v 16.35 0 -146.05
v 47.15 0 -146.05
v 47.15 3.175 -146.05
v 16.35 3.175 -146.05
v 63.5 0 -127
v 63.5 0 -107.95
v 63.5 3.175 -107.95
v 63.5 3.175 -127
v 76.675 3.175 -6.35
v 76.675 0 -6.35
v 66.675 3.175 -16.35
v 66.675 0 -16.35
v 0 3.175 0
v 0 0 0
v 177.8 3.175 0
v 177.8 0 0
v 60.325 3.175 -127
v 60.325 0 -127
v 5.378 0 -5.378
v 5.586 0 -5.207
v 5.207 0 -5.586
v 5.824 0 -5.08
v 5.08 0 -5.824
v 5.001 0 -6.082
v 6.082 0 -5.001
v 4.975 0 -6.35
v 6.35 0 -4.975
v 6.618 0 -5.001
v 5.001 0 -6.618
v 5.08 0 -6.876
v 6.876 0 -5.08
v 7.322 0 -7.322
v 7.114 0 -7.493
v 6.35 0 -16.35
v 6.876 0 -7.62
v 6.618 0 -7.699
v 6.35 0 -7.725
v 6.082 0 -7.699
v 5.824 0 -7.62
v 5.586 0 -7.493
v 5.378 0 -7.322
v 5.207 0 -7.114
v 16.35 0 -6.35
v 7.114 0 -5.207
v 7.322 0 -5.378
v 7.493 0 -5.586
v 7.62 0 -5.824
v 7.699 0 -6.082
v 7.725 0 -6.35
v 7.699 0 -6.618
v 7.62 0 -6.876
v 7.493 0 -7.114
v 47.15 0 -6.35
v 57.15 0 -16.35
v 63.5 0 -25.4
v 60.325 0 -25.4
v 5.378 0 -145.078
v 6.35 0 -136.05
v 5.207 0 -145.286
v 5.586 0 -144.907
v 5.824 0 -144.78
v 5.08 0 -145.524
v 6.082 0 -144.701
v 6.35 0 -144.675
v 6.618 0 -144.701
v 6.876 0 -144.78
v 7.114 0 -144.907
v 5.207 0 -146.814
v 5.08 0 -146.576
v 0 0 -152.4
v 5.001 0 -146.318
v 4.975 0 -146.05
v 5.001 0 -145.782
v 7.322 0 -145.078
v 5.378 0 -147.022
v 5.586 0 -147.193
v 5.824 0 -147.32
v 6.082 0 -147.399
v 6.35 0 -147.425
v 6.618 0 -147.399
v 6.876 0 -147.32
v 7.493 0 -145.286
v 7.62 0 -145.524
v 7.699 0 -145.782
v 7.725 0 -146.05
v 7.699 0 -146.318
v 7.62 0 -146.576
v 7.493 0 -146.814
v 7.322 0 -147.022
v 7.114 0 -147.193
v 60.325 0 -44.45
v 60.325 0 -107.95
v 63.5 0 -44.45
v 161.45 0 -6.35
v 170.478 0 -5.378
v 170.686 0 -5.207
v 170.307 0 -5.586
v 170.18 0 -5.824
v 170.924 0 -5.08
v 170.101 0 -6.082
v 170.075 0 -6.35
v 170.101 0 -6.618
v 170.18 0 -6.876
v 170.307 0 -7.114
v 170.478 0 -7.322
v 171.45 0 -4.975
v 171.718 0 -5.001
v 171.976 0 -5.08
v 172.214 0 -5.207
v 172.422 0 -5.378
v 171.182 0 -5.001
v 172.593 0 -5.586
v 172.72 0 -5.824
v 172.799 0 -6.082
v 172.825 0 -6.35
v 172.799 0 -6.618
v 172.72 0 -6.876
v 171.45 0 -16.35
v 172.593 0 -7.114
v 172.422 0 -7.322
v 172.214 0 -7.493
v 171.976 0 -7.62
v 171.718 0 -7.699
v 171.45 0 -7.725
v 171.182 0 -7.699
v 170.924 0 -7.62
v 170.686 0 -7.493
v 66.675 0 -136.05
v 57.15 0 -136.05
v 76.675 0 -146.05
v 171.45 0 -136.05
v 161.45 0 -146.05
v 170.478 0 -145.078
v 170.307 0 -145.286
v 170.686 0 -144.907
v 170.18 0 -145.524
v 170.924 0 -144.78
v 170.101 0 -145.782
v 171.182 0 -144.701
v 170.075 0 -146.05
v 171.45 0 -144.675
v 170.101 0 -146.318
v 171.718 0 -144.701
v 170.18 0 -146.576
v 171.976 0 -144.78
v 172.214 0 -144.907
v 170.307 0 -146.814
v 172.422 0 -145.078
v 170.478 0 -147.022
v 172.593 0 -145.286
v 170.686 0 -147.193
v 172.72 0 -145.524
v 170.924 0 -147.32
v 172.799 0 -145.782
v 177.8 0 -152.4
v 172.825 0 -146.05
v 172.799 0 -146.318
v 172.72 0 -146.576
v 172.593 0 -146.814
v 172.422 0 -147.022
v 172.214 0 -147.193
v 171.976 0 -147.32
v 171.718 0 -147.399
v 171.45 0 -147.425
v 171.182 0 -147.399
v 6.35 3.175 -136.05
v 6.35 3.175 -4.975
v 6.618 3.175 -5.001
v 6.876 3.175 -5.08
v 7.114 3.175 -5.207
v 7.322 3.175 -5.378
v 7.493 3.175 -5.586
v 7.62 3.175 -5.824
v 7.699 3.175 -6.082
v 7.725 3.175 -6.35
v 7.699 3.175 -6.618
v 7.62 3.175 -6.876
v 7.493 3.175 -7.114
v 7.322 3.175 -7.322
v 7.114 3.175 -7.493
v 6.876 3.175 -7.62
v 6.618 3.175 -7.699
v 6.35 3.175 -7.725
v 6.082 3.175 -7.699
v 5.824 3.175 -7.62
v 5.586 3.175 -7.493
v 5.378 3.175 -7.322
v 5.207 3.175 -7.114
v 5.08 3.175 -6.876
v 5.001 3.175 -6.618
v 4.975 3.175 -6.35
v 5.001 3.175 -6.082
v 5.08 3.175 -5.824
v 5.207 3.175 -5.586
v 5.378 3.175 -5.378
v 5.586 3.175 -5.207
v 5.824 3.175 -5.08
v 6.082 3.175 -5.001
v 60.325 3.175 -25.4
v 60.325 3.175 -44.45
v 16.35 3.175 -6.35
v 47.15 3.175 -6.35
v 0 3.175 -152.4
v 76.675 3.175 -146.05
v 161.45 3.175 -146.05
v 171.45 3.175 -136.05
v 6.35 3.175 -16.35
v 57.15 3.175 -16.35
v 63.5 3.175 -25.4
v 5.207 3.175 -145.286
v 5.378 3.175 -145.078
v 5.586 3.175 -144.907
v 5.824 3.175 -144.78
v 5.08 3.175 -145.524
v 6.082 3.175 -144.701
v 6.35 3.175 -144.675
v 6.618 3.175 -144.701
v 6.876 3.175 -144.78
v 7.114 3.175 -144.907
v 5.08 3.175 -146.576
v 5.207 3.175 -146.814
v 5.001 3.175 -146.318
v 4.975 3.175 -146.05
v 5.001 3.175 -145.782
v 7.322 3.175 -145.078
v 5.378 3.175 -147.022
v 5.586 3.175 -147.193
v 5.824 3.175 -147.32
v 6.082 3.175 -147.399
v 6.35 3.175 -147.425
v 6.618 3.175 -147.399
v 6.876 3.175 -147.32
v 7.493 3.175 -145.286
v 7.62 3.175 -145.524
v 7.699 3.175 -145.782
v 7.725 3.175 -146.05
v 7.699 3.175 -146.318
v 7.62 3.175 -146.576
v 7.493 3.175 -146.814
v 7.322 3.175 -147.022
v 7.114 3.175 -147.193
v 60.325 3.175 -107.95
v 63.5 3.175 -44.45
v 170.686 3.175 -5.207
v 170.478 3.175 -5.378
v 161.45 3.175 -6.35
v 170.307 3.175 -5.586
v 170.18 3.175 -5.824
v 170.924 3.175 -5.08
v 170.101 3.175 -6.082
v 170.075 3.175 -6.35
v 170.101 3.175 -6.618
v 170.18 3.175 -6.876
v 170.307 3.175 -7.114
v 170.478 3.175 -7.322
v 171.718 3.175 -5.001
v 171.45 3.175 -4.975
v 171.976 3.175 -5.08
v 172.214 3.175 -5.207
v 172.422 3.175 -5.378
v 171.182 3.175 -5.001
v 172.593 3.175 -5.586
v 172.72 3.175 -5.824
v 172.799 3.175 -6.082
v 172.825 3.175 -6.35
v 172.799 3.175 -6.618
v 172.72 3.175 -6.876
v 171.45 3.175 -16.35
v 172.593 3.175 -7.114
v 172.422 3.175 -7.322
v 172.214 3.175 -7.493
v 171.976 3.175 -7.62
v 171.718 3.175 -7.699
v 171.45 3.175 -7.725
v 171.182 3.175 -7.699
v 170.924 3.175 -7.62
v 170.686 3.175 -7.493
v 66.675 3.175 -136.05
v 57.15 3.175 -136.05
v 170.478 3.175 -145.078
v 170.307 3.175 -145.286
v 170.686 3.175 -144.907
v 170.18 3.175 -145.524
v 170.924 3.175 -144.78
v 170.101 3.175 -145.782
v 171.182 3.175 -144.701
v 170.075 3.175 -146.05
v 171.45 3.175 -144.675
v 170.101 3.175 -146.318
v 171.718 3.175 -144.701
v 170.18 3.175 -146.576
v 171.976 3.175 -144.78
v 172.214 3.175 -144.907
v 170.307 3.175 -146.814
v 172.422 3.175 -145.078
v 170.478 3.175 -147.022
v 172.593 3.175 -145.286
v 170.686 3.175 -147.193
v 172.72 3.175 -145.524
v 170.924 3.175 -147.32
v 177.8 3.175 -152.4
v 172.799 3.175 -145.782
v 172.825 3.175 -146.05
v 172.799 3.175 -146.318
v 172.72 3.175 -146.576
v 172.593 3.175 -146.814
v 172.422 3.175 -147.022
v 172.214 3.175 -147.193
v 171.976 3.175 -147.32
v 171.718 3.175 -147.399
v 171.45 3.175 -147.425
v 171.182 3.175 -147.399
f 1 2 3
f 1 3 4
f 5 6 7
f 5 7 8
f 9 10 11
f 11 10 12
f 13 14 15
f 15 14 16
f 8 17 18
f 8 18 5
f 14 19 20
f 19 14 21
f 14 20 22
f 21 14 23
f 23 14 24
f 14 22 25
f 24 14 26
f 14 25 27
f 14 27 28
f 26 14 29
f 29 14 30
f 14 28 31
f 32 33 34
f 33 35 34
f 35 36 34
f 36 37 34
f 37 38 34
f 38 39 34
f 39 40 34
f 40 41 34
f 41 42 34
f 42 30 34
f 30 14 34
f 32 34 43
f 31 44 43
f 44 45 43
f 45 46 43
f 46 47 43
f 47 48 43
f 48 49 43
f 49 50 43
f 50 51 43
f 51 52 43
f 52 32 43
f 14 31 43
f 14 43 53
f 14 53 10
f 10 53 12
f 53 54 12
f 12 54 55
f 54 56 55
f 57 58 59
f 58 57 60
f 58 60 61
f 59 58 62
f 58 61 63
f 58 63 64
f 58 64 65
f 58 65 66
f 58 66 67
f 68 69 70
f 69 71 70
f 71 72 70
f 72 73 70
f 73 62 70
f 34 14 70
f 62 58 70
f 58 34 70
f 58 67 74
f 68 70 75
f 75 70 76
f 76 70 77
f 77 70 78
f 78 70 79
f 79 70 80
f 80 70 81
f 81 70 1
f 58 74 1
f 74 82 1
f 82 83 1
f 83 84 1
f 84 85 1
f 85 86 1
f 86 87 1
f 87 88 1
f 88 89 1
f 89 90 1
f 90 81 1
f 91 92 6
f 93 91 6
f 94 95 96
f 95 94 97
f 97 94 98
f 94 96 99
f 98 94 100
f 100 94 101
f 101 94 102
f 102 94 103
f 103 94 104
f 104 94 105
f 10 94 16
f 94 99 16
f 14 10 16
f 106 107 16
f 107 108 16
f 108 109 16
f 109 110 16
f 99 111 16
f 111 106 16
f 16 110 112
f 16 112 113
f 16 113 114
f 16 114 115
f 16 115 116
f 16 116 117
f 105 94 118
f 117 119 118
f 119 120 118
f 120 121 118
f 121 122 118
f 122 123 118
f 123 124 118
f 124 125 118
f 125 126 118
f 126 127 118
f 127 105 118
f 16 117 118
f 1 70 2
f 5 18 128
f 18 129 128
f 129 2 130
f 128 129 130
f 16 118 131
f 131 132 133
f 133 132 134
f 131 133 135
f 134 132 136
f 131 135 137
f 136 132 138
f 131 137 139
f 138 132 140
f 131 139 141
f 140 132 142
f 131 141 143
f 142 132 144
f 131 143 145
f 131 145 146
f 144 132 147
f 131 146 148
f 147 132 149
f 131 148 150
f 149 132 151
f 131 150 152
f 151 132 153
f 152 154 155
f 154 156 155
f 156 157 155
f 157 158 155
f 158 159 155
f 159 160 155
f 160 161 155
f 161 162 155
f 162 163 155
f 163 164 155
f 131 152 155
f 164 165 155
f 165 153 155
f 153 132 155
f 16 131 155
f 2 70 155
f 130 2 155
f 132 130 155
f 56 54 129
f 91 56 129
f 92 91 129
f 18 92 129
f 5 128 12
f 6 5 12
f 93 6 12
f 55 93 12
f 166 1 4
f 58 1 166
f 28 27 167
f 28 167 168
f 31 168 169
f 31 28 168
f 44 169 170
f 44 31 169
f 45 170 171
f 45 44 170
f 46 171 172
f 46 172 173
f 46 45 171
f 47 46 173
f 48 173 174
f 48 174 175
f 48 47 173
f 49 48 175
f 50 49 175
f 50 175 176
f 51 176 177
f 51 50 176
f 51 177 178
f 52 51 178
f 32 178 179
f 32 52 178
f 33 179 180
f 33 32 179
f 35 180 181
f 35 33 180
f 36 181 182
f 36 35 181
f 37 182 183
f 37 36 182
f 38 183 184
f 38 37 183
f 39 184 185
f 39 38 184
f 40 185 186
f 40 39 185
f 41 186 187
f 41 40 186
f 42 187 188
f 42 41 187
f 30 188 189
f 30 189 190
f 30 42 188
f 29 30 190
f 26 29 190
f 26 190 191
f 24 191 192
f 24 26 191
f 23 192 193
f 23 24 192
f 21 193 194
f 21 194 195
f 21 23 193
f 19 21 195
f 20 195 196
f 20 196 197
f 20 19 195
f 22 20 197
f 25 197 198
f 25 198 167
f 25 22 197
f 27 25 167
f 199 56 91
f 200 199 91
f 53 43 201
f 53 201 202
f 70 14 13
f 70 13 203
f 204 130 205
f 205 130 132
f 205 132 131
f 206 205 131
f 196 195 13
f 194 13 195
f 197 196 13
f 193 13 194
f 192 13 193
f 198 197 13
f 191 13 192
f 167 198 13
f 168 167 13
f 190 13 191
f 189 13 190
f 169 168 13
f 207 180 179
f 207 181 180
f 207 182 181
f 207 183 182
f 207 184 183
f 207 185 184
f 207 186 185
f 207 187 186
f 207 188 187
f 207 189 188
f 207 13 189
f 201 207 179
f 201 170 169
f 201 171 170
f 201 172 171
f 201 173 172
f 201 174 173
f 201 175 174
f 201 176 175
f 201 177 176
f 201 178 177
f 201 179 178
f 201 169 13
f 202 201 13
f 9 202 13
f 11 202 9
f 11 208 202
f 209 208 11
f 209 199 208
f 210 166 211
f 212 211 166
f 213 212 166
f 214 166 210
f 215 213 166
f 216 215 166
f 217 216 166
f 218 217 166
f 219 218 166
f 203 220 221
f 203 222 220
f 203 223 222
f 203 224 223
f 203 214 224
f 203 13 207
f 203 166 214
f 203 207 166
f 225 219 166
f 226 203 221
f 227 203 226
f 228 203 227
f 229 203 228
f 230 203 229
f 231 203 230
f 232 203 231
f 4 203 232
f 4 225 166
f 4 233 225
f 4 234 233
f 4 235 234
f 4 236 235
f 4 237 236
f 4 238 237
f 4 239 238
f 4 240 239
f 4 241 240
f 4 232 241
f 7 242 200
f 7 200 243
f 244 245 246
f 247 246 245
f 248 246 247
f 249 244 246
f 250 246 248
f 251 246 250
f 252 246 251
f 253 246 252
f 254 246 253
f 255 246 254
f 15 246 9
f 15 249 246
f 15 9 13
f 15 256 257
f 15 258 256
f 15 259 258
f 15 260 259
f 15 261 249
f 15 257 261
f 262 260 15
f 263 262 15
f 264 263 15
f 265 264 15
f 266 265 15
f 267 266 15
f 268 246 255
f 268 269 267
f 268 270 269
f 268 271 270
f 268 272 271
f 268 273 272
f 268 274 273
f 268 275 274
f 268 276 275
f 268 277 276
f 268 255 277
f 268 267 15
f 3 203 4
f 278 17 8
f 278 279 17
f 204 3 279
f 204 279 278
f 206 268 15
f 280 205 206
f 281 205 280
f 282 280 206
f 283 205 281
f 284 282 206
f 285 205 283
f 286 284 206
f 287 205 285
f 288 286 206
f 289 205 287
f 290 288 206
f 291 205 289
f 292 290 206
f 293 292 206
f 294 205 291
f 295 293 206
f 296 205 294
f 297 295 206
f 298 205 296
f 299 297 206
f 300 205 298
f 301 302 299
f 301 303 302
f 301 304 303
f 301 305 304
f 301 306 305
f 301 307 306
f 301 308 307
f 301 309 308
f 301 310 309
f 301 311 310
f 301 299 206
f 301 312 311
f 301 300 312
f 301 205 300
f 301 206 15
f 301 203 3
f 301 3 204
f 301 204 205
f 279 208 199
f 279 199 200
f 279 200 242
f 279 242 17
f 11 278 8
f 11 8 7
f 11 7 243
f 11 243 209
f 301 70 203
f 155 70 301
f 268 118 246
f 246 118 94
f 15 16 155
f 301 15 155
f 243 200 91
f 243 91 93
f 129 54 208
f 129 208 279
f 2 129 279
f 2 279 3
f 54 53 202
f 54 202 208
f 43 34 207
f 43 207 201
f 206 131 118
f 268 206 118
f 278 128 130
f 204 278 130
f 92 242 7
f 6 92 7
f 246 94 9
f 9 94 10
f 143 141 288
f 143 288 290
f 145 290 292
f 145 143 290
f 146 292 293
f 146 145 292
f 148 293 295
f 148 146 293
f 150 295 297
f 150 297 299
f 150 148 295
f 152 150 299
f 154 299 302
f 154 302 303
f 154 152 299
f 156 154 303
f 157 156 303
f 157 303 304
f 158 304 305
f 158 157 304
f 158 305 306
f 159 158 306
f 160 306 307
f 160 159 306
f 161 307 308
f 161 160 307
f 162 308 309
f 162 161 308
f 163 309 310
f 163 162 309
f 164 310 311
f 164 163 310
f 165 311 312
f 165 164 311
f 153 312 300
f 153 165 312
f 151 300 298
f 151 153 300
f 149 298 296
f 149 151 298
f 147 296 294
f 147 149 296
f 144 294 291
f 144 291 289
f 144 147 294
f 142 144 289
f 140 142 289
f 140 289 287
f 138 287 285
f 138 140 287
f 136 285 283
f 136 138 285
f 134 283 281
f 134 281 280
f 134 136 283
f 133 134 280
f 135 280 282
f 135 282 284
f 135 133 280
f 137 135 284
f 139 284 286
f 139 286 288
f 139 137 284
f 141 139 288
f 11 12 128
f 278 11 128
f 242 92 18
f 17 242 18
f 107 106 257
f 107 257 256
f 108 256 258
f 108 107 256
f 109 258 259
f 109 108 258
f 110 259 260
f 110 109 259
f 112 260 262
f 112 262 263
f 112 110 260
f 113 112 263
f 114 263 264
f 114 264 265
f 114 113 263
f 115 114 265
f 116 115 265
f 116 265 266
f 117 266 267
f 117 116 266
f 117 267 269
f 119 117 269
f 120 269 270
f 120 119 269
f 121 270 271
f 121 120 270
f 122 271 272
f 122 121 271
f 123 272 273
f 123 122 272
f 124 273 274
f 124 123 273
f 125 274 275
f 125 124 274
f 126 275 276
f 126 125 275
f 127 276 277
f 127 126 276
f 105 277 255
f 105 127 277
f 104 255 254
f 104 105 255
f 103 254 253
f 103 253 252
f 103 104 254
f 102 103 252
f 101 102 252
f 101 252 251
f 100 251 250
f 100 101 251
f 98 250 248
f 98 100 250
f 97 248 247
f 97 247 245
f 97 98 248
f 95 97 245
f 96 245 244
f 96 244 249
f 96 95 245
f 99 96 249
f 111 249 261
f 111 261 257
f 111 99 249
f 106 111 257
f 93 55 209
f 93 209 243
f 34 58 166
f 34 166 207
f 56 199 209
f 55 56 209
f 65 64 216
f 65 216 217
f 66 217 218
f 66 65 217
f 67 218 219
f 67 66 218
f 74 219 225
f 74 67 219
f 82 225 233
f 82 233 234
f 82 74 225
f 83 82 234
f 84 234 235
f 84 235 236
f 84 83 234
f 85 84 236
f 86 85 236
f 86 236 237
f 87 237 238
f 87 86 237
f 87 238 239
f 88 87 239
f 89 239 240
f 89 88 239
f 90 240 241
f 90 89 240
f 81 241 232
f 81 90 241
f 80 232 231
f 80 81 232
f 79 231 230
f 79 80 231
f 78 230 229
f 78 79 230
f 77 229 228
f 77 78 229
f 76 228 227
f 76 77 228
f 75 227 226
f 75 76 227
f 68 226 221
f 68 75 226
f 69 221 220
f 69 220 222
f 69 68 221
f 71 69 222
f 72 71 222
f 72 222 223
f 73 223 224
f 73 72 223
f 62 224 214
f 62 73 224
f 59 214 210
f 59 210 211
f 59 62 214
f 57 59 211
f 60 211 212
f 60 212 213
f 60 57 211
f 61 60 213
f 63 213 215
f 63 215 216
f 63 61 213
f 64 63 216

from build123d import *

# Parameters (mm, degrees)
SKETCH1_W           = 177.8
SKETCH1_H           = 152.4
SKETCH1_R           = 1.375
SKETCH1_W_2         = 3.175
SKETCH1_H_2         = 19.05
BOSS_EXTRUDE5_DEPTH = 3.175


with BuildPart() as part:
    # Sketch1 → Boss-Extrude5 (new body)
    with BuildSketch(Plane(origin=(0, 0, 0), x_dir=(1, 0, 0), z_dir=(0, 1, 0))):
        with Locations((88.9, 76.2)):
            Rectangle(SKETCH1_W, SKETCH1_H)
        with Locations(Location((6.35, 146.05, 0), (0, 0, 270))):
            Circle(SKETCH1_R, mode=Mode.SUBTRACT)
        with Locations(Location((6.35, 6.35, 0), (0, 0, 270))):
            Circle(SKETCH1_R, mode=Mode.SUBTRACT)
        with Locations(Location((171.45, 6.35, 0), (0, 0, 270))):
            Circle(SKETCH1_R, mode=Mode.SUBTRACT)
        with Locations(Location((171.45, 146.05, 0), (0, 0, 270))):
            Circle(SKETCH1_R, mode=Mode.SUBTRACT)
        Polygon((6.35, 16.35), (16.35, 6.35), (47.15, 6.35), (57.15, 16.35), (57.15, 136.05), (47.15, 146.05), (16.35, 146.05), (6.35, 136.05), align=None, mode=Mode.SUBTRACT)
        Polygon((76.675, 146.05), (161.45, 146.05), (171.45, 136.05), (171.45, 16.35), (161.45, 6.35), (76.675, 6.35), (66.675, 16.35), (66.675, 136.05), align=None, mode=Mode.SUBTRACT)
        with Locations((61.9125, 117.475)):
            Rectangle(SKETCH1_W_2, SKETCH1_H_2, mode=Mode.SUBTRACT)
        with Locations((61.9125, 34.925)):
            Rectangle(SKETCH1_W_2, SKETCH1_H_2, mode=Mode.SUBTRACT)
    extrude(amount=BOSS_EXTRUDE5_DEPTH)


solid = part.part
